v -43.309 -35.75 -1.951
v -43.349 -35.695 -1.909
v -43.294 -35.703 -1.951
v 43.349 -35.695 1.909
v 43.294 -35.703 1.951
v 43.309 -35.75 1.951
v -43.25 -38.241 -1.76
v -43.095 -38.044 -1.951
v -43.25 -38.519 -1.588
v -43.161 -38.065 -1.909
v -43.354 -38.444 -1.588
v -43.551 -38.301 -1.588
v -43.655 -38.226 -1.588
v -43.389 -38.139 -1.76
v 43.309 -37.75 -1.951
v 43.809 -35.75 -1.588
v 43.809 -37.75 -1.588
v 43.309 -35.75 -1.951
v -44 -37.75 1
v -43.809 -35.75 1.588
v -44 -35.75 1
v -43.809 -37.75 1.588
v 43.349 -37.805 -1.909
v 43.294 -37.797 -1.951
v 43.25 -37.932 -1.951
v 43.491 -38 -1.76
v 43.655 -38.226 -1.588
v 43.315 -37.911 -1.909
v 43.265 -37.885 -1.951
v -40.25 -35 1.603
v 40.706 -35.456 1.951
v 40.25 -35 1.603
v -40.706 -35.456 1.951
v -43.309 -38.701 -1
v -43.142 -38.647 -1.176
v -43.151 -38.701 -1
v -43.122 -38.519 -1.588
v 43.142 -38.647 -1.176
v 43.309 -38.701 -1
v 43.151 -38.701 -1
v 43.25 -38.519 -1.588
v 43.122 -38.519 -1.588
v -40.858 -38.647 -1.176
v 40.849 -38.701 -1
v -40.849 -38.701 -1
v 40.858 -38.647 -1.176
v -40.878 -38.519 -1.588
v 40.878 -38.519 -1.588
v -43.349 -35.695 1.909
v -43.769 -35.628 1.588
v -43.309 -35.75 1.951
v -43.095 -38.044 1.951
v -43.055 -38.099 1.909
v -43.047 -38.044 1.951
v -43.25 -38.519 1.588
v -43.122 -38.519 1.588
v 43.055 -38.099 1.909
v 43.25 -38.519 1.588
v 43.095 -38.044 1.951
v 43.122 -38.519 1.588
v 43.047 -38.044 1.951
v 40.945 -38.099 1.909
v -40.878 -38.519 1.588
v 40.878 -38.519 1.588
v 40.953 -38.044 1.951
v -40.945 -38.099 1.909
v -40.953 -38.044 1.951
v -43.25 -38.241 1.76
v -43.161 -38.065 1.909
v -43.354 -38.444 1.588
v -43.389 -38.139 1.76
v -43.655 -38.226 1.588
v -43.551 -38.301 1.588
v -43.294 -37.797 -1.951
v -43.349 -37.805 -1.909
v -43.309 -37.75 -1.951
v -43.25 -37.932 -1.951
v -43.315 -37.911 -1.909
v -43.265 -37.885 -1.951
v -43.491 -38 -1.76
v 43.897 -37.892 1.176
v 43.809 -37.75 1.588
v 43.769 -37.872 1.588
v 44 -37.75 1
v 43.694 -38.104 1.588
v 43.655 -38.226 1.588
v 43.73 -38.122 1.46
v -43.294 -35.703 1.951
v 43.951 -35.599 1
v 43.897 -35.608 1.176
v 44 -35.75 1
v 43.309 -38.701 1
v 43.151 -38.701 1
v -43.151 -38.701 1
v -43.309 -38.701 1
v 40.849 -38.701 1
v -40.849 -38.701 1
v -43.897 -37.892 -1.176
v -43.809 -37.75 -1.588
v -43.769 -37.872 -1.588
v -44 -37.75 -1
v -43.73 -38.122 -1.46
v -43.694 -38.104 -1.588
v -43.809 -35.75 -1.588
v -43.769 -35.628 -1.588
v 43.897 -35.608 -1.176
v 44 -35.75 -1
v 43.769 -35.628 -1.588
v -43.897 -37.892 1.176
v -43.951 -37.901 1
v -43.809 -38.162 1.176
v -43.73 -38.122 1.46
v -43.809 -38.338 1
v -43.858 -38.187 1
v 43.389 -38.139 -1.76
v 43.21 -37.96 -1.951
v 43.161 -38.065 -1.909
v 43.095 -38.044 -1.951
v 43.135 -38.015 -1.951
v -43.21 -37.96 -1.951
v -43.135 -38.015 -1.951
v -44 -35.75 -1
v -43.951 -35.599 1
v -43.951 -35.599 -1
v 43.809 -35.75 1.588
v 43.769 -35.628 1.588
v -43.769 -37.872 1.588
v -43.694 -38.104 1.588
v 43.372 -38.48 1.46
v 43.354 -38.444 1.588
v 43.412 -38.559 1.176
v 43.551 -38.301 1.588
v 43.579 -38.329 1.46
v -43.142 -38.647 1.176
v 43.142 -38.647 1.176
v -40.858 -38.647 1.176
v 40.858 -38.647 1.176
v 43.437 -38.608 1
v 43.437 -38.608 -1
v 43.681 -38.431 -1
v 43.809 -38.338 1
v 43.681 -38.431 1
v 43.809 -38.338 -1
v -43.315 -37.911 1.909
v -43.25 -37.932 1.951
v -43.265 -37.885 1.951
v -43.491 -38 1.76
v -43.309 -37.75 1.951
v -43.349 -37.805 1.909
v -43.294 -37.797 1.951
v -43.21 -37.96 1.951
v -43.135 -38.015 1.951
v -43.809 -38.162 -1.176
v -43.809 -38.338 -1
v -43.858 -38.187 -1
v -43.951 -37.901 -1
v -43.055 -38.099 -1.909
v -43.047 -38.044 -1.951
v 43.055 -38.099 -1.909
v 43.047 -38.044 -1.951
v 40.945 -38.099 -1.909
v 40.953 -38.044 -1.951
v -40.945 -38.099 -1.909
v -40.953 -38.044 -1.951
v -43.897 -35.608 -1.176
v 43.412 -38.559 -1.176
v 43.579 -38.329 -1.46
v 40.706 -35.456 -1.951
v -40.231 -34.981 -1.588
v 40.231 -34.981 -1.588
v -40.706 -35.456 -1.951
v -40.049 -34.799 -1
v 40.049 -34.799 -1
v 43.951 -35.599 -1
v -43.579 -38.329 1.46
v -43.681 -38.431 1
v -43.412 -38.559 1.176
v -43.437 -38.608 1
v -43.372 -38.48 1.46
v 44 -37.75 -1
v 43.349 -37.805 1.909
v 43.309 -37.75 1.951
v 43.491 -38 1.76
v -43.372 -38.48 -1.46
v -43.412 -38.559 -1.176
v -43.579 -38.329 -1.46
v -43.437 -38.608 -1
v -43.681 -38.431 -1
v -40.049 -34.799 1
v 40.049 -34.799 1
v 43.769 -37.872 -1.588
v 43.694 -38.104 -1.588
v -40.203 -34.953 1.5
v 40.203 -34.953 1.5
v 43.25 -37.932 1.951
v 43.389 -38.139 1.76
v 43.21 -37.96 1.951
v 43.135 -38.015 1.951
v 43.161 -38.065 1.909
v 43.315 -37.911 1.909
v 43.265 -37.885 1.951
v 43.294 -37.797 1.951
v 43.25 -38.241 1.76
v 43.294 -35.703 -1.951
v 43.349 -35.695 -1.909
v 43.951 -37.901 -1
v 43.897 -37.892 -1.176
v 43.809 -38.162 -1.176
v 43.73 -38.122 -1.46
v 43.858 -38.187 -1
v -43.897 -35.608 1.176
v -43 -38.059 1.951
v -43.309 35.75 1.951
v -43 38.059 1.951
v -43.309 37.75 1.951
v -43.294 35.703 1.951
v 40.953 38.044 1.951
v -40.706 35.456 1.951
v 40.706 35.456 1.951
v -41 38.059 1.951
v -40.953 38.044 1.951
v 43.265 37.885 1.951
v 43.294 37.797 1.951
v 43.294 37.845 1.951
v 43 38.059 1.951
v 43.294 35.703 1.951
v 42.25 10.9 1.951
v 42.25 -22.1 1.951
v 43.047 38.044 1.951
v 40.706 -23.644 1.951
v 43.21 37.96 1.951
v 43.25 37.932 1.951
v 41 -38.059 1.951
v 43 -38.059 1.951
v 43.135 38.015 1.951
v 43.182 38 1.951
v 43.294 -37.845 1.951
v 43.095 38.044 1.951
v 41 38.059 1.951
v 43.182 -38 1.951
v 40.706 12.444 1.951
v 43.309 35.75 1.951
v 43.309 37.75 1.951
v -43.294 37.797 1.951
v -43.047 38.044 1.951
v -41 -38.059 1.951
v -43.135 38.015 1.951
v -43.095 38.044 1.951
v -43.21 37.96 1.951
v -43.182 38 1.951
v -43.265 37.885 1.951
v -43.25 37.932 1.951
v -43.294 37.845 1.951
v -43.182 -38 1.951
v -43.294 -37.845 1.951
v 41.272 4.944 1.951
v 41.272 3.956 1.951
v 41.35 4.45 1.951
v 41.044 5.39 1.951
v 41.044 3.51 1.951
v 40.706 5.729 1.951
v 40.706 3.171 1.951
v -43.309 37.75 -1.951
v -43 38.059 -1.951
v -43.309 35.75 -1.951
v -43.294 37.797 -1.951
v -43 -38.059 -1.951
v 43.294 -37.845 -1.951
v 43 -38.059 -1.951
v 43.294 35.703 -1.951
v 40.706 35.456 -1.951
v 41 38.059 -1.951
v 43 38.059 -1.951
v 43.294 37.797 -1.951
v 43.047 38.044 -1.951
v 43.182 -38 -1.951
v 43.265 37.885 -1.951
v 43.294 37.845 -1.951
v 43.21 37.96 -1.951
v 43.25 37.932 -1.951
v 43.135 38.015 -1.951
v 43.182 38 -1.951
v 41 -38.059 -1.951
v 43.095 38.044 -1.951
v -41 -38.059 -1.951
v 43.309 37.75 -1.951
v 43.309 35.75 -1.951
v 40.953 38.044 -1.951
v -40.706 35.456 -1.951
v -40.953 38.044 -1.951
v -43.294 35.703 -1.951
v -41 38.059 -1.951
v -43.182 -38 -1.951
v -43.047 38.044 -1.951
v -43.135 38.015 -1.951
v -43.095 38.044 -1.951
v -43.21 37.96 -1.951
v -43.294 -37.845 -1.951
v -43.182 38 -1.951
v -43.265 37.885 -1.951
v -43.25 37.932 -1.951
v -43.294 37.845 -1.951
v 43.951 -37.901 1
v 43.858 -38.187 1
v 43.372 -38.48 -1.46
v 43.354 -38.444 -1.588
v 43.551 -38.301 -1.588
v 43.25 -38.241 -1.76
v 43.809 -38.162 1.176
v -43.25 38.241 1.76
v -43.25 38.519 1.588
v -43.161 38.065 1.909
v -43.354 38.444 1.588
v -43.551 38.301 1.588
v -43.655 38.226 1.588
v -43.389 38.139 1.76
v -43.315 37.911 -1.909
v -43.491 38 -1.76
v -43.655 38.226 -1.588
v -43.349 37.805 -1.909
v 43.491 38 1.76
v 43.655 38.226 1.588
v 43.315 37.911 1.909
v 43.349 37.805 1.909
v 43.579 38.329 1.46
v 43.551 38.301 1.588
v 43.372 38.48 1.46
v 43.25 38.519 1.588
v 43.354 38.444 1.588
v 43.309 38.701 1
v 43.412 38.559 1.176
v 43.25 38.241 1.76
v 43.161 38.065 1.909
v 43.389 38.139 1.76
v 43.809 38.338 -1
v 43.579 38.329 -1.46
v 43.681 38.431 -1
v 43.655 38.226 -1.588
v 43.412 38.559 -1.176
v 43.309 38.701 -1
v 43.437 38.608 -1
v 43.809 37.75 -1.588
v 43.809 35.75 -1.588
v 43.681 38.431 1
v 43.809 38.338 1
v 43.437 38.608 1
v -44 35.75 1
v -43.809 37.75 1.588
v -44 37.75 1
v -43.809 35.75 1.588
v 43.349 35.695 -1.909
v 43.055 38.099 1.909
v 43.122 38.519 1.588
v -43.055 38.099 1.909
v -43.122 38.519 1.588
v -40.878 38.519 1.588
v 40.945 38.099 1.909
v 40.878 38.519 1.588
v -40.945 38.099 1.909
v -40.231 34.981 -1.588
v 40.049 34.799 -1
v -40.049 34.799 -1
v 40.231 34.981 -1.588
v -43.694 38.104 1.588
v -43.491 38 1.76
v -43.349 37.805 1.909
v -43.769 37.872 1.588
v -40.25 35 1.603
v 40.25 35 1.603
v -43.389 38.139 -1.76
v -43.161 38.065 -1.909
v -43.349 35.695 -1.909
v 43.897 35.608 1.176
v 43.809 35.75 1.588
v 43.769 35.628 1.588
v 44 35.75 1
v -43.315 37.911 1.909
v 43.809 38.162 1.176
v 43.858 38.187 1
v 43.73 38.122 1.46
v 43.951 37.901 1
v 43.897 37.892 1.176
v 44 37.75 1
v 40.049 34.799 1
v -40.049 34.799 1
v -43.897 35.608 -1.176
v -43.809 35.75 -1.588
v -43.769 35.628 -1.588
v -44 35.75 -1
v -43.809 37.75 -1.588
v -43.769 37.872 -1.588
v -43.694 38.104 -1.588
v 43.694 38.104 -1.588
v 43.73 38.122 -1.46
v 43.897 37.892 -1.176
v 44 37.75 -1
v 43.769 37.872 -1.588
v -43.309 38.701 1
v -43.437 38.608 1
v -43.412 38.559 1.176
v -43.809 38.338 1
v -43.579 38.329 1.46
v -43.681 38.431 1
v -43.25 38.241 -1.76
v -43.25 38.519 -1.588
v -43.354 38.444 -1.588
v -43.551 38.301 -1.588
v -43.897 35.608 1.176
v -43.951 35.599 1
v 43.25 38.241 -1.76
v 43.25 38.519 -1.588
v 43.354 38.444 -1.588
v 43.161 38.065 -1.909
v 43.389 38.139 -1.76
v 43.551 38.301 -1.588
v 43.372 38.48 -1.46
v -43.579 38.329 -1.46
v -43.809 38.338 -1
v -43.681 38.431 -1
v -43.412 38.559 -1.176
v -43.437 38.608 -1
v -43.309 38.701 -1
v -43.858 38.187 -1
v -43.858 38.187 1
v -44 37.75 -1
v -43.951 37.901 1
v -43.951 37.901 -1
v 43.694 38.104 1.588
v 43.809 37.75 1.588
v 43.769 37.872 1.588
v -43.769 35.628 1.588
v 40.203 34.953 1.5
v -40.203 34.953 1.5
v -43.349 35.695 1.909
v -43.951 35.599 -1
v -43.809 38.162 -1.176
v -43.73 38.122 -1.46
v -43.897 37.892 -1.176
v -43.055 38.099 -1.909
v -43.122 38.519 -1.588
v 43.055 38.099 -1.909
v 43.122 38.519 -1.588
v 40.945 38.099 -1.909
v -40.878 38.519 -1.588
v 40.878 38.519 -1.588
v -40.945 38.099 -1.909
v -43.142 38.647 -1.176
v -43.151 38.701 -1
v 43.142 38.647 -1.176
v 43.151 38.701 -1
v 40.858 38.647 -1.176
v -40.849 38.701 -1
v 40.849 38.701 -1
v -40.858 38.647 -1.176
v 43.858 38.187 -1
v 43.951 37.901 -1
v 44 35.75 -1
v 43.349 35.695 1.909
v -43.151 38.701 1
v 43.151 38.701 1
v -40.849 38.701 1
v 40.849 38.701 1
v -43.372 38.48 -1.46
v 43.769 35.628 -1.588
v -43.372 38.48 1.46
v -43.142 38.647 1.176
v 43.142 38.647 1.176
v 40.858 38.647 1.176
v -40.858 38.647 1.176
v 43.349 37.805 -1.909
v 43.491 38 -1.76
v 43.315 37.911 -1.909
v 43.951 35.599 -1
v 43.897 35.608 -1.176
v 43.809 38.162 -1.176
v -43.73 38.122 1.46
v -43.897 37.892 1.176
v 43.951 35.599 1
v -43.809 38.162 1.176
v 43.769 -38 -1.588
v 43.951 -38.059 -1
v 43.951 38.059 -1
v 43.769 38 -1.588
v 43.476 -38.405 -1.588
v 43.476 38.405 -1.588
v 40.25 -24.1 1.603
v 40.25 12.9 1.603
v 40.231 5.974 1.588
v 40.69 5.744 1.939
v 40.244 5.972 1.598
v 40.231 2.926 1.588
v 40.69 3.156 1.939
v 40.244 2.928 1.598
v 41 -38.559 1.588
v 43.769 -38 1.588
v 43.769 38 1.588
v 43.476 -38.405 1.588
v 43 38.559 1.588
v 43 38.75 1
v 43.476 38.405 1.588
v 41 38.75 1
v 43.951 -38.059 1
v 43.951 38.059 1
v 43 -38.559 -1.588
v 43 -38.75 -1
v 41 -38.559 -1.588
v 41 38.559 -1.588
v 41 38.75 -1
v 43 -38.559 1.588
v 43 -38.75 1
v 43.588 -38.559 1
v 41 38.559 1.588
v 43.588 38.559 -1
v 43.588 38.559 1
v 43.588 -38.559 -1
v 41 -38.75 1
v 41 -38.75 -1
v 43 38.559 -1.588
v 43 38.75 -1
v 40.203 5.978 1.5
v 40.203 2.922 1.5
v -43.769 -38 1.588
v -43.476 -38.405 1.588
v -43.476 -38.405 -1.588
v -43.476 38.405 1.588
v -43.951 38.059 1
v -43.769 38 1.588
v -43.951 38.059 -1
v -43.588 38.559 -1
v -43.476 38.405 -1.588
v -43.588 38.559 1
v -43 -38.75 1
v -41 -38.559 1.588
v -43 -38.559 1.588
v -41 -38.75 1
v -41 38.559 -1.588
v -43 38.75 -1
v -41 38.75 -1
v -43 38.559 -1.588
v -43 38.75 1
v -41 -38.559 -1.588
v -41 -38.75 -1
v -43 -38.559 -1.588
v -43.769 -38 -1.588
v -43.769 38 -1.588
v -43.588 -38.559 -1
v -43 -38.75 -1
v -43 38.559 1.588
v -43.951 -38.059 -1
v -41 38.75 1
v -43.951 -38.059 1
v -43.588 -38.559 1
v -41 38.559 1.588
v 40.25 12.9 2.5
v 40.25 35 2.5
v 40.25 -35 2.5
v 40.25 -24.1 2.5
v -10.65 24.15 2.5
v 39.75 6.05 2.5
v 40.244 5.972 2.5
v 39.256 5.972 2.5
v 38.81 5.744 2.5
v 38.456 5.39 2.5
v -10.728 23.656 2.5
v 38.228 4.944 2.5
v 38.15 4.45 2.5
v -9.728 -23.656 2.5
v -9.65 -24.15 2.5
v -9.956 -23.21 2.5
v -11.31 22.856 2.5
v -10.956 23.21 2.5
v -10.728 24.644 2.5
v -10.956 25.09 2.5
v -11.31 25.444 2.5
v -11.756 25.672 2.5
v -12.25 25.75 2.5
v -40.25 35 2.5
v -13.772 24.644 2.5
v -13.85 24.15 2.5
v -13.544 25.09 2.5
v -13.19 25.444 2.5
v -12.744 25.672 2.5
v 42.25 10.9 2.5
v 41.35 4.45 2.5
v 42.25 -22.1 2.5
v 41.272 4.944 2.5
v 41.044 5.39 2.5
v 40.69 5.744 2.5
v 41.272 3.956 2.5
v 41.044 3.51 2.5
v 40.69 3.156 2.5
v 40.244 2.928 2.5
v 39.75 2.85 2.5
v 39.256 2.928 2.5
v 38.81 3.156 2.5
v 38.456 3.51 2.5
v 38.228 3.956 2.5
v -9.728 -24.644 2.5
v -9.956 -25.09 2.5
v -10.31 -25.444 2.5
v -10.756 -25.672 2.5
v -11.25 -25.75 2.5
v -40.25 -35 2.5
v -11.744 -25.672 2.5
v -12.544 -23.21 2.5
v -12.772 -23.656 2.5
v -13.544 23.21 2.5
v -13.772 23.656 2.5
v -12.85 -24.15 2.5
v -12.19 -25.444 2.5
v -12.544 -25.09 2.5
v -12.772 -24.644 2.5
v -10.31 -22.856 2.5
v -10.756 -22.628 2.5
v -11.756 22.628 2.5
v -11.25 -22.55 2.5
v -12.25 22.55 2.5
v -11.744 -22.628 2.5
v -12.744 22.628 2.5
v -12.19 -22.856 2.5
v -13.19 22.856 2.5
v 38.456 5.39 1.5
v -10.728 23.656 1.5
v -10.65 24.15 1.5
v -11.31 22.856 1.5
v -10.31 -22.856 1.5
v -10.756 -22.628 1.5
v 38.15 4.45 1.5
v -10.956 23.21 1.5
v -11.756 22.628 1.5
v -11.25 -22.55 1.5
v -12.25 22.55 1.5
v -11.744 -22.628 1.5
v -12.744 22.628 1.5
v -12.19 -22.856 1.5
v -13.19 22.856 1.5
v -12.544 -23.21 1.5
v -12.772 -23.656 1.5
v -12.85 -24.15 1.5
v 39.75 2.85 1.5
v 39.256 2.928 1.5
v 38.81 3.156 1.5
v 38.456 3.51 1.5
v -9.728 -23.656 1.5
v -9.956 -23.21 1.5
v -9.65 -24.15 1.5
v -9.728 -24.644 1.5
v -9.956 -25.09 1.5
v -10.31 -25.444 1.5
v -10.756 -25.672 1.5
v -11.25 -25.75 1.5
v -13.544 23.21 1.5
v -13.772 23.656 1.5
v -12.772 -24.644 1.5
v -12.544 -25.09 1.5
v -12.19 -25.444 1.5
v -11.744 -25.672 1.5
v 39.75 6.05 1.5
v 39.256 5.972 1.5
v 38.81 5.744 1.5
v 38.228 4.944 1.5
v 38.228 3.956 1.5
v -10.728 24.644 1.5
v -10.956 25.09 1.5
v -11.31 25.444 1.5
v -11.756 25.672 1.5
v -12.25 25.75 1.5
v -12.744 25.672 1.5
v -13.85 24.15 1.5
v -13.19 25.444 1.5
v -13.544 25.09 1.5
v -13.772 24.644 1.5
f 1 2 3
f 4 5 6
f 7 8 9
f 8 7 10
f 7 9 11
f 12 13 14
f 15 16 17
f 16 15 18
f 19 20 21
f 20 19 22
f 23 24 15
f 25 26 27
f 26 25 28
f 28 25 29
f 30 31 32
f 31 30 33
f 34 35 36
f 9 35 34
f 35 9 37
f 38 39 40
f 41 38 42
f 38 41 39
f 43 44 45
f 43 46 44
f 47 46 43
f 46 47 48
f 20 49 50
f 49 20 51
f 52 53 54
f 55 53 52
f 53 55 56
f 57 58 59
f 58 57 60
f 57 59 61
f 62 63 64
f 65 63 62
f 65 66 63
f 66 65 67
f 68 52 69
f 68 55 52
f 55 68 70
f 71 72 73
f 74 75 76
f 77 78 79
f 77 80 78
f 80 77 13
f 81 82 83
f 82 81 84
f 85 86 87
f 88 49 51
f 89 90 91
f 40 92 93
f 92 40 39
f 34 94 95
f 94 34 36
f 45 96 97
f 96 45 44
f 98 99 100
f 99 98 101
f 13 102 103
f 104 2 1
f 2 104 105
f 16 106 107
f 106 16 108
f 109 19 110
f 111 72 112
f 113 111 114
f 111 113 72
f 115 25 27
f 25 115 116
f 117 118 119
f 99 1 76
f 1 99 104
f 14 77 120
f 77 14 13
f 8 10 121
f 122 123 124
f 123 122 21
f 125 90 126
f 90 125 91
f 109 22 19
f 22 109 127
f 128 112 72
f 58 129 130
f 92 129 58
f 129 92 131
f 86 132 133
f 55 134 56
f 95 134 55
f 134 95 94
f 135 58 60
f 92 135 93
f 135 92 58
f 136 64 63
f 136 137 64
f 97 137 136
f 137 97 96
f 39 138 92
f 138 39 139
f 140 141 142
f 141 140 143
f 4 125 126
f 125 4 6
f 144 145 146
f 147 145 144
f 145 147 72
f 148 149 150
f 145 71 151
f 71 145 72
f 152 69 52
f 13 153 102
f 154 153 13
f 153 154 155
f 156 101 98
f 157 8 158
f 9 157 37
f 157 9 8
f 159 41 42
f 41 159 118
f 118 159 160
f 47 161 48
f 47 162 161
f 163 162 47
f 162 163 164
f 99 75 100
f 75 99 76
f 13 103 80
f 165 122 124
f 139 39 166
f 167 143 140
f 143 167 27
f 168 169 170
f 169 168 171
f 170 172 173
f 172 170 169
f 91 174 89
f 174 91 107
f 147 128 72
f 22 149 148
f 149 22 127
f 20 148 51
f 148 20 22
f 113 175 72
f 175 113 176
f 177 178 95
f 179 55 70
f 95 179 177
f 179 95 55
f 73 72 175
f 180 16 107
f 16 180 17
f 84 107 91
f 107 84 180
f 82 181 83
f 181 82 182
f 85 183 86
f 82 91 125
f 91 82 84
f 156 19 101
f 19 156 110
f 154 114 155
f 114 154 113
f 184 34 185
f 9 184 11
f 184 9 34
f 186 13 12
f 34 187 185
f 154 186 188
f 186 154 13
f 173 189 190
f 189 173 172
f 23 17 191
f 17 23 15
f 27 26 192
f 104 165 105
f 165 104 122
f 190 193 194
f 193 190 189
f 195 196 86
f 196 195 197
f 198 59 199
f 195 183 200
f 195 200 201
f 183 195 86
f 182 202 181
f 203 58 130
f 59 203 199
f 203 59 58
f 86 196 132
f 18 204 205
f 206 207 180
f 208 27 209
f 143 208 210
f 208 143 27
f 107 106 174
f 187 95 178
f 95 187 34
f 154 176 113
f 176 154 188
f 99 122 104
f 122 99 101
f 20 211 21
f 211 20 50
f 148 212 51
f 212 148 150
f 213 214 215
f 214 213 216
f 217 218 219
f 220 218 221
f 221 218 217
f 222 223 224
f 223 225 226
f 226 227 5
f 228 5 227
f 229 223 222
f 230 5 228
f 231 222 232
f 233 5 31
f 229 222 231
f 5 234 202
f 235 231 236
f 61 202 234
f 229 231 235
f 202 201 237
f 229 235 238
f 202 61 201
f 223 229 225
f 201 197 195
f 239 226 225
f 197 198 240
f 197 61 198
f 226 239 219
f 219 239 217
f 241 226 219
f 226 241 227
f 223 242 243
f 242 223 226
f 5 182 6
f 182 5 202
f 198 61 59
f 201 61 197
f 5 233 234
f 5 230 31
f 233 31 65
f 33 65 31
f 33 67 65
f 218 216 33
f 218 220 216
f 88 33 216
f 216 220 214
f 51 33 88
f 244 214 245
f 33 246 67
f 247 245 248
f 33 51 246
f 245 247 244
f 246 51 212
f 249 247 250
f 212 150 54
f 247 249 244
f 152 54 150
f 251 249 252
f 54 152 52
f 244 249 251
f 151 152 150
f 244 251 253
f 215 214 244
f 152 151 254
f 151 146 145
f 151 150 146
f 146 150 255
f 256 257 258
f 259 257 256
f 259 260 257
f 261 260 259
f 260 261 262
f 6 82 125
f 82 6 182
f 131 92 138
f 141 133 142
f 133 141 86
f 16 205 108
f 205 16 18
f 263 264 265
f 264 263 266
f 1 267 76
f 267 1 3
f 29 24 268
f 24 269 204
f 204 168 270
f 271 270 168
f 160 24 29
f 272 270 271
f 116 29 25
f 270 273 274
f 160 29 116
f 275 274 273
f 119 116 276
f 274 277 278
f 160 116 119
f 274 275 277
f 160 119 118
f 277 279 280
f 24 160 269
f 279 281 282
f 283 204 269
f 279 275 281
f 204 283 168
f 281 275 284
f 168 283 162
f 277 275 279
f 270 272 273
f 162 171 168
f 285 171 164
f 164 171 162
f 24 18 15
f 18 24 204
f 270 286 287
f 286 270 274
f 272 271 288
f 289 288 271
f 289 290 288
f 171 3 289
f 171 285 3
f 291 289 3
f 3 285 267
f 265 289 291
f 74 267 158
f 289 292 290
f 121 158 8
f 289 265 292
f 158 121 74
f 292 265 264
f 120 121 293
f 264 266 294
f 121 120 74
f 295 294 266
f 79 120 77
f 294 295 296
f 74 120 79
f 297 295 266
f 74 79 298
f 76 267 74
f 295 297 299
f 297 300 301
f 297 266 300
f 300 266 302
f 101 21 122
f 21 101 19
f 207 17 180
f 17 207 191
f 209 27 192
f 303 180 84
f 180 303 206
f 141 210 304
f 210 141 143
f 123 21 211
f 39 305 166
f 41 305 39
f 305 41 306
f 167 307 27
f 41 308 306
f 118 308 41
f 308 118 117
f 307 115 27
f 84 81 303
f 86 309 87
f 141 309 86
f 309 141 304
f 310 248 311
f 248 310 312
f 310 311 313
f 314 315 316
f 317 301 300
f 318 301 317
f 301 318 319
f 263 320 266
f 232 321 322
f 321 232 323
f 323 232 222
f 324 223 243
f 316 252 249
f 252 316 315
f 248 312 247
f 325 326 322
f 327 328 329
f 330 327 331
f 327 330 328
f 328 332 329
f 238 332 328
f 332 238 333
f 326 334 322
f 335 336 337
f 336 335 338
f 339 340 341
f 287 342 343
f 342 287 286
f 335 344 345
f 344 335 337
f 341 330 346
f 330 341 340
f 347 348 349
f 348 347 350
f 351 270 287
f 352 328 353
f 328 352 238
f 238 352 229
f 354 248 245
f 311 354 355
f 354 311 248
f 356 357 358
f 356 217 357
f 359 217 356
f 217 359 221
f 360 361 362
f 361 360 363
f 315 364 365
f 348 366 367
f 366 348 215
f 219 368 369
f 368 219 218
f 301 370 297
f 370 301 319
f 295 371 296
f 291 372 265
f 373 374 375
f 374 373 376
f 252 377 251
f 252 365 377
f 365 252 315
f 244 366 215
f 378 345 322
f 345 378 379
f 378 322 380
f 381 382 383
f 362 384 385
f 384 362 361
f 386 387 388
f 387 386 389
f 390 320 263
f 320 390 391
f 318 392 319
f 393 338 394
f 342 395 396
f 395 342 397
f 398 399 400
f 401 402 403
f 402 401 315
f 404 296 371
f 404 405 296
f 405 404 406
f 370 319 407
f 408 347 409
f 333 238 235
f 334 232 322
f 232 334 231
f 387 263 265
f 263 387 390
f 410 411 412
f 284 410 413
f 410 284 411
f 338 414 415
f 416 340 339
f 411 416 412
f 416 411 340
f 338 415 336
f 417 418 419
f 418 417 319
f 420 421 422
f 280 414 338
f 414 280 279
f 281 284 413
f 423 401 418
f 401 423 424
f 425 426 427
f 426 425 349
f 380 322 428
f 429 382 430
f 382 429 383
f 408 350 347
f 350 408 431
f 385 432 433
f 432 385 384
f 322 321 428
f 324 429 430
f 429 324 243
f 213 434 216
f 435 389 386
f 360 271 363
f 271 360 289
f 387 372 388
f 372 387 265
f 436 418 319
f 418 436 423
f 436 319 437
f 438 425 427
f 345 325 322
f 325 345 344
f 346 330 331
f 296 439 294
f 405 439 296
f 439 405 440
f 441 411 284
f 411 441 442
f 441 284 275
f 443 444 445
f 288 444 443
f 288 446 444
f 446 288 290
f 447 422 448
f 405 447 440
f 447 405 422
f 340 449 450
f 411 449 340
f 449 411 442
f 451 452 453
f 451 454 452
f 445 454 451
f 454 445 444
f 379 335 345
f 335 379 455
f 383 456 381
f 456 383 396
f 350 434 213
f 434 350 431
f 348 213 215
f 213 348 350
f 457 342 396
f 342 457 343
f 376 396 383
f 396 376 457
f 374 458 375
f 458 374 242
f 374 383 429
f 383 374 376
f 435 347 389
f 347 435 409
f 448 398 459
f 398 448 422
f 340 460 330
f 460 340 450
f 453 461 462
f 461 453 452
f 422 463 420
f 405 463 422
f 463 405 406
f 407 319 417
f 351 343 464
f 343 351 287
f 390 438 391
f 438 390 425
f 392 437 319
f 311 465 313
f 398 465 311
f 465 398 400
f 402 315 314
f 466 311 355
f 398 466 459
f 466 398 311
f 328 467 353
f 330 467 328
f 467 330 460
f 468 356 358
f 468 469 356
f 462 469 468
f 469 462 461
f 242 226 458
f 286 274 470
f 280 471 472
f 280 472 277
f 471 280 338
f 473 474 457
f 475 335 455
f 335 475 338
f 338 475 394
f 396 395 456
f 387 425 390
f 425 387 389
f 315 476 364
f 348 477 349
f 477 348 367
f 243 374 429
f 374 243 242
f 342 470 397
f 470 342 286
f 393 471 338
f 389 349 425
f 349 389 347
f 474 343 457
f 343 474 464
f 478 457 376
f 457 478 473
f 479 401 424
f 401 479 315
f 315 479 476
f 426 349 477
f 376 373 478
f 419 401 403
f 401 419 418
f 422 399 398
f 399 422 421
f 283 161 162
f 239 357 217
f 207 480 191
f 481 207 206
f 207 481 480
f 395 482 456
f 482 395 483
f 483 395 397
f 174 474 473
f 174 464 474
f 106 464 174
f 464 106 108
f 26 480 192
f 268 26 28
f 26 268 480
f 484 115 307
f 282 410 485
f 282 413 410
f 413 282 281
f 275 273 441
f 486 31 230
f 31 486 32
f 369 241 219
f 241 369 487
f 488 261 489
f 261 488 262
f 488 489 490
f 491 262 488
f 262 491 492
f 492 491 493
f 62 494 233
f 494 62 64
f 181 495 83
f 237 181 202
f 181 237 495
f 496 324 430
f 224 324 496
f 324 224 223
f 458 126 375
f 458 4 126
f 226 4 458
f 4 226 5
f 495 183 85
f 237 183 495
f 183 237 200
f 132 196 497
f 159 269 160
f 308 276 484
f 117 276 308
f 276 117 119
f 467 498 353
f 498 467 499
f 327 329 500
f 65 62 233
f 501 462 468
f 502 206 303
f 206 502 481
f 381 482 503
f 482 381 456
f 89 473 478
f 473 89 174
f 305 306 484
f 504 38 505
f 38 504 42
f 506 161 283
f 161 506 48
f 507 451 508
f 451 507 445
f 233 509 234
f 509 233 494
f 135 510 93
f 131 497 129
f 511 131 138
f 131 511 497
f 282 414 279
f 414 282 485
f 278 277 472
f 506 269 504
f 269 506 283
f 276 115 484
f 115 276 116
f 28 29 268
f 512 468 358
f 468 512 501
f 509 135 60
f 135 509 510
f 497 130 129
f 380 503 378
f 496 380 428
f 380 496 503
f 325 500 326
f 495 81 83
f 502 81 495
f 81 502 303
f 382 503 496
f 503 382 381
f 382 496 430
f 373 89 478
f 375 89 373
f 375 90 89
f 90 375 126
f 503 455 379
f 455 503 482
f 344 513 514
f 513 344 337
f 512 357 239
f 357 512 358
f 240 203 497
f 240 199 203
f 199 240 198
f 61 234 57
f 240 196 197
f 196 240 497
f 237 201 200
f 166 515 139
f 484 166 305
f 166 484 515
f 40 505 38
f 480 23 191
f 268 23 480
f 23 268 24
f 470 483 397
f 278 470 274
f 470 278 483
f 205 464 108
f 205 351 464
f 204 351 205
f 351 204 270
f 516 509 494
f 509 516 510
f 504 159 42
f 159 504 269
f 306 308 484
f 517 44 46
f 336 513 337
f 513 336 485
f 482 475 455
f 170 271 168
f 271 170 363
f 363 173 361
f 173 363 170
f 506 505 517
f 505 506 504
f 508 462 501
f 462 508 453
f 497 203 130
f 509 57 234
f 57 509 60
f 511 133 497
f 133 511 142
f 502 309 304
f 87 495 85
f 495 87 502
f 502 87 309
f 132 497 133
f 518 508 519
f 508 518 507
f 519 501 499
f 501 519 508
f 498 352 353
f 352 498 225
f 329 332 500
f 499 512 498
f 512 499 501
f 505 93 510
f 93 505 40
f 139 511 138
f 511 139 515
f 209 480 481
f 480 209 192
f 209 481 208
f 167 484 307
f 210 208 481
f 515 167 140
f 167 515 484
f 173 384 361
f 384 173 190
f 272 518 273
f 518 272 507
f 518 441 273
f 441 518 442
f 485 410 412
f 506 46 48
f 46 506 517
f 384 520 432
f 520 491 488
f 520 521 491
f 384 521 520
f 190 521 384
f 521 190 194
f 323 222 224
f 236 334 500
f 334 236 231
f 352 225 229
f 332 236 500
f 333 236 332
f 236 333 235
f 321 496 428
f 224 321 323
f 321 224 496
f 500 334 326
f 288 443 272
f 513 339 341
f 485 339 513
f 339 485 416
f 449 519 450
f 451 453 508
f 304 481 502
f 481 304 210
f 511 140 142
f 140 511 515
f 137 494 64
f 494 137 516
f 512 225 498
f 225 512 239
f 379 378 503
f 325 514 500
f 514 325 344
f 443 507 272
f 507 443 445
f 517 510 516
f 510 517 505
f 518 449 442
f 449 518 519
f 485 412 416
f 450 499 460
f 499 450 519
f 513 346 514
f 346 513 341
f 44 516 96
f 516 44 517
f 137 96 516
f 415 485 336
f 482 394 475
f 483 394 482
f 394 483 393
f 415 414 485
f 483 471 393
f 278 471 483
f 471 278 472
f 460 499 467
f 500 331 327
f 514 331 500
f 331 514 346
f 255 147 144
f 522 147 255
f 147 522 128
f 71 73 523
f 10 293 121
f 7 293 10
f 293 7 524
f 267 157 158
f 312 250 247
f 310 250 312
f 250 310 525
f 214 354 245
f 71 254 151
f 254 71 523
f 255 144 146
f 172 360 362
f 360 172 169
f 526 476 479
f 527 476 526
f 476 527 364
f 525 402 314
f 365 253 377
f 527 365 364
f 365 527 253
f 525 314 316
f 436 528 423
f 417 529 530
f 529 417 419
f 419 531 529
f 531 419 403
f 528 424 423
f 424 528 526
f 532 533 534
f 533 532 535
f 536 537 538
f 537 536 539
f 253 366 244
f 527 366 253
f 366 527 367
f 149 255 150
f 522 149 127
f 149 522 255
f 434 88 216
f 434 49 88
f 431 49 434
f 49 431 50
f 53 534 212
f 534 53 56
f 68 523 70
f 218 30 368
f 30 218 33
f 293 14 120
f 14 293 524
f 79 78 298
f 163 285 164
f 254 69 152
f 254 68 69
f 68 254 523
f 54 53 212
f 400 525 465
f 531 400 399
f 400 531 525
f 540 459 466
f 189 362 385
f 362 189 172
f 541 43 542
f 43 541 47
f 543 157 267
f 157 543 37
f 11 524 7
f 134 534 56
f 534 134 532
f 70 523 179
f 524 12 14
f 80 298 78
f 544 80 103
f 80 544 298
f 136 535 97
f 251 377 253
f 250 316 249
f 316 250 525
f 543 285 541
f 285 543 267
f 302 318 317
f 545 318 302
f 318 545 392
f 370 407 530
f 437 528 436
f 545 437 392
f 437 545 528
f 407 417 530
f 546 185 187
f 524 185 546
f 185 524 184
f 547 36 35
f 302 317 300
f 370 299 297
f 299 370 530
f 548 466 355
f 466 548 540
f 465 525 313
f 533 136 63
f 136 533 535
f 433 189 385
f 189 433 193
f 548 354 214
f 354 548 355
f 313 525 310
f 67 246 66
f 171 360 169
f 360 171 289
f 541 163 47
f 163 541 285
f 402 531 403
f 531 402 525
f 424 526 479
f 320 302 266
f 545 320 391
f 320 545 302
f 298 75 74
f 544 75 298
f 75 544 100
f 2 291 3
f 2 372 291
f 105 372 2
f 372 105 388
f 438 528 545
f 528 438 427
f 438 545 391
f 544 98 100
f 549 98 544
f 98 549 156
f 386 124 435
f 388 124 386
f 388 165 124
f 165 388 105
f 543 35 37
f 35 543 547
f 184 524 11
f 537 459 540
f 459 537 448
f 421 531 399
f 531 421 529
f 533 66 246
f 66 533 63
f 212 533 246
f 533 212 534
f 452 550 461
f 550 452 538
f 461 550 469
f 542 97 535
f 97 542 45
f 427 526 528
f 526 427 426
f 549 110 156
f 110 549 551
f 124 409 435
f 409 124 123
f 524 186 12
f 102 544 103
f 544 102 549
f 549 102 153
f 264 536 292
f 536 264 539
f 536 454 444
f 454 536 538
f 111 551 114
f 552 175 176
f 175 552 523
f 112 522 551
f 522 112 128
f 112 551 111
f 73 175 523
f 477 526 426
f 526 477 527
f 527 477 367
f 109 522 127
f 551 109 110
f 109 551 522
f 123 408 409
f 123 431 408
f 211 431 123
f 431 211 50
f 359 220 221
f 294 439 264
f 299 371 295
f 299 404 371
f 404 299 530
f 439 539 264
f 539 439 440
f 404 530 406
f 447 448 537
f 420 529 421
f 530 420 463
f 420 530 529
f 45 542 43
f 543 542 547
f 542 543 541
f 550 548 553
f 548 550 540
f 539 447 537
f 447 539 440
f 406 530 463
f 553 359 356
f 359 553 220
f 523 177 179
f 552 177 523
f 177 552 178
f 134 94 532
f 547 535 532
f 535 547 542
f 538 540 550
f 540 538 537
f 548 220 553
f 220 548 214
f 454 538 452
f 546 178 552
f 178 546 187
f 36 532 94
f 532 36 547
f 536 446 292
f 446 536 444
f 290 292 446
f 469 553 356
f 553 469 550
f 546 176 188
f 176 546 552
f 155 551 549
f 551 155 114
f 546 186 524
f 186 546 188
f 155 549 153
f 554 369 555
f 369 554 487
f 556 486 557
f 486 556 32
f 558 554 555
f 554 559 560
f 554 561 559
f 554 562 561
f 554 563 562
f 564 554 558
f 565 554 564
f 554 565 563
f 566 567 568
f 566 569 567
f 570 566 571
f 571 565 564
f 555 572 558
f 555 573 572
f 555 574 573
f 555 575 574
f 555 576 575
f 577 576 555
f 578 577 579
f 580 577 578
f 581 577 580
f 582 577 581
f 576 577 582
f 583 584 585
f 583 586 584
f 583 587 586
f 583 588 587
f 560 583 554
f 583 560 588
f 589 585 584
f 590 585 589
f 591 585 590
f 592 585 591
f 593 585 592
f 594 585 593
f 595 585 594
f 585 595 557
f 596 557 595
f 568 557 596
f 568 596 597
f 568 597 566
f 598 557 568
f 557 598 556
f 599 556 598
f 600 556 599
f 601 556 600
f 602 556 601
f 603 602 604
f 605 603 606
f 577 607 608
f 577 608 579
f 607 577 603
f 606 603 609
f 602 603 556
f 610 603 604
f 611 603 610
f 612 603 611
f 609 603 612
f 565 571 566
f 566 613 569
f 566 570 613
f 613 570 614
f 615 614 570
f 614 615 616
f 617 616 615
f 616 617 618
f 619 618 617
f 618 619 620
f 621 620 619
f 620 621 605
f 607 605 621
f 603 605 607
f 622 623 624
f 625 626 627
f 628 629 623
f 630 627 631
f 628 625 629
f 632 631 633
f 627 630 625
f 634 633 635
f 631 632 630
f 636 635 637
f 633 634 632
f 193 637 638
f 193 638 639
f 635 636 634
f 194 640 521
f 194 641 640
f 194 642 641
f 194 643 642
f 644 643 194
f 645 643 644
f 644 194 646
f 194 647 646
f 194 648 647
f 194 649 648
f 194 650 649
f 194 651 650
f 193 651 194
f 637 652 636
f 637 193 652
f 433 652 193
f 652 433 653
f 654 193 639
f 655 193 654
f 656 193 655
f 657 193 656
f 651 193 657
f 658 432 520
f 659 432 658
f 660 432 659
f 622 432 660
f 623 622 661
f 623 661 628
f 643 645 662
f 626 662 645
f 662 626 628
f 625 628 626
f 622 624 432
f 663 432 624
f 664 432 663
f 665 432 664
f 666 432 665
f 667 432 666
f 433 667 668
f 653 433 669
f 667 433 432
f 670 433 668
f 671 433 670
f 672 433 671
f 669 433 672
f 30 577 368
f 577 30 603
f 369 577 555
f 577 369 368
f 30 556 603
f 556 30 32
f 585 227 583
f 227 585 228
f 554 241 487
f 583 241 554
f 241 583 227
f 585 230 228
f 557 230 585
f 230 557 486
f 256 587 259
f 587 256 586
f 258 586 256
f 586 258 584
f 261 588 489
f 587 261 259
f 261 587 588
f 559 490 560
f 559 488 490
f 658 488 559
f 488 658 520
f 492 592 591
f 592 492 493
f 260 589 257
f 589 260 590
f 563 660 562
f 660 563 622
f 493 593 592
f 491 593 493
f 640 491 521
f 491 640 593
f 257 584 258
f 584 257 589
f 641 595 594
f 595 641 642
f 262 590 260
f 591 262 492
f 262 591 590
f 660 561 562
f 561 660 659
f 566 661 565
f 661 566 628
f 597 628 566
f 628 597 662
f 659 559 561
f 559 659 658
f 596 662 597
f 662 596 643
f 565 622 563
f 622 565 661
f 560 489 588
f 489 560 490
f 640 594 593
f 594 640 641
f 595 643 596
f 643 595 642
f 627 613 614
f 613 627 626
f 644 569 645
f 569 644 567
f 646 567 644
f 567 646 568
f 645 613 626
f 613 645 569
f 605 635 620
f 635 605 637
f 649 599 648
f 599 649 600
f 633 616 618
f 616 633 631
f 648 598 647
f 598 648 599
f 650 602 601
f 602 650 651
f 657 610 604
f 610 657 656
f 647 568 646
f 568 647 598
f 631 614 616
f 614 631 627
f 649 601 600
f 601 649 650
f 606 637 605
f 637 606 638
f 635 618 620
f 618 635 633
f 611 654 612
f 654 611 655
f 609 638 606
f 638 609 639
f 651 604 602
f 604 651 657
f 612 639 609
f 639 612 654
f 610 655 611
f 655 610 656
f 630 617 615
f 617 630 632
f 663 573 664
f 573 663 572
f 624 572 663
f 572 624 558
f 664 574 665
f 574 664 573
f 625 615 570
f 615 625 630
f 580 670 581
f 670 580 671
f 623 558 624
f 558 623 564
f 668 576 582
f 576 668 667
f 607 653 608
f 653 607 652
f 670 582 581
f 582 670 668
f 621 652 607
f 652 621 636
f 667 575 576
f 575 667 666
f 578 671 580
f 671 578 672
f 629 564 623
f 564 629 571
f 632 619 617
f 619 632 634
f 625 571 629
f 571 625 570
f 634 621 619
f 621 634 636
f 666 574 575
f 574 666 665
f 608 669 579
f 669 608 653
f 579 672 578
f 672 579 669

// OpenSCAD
// file: Nucleo.scad
module nucleo(){
color([0.9,0.9,0.9])
union(){
difference(){
union(){
cube([80.5,70,1],center=true);
translate([80.5/2+1,-8.5+2.9,0])cube([2,33,1],center=true);
translate([80.5/2,33/2-8.5+2.9,0])
linear_extrude(1,center=true)polygon(points=[[0,2],[2,0],[0,0]]);

translate([80.5/2,-33/2-8.5+2.9,0])rotate([0,0,-90])
linear_extrude(1,center=true)polygon(points=[[0,2],[2,0],[0,0]]);
}

translate([80.5/2-0.5,8.9/2,0])cylinder(2,1.6,1.6,center=true,$fn=20);

translate([-13.85+1.6+1.0,-24.15,0])cylinder(2,1.6,1.6,center=true,$fn=20);
translate([-14.85+1.6+1.0,24.15,0])cylinder(2,1.6,1.6,center=true,$fn=20);

}
}
}

//nucleo();
// file: Rounded3dCube.scad
module RoundedCube(x,y,z,r){
minkowski() {
  cube([x,y,z],center=true);
  // rounded corners
  sphere(r);
}
}
// main file
include<Rounded3dCube.scad>
include<Nucleo.scad>
R=1;
Cy=2;
Cz=2;
$fn=10;
Lx=80.5+R+Cy+0.5;
Ly=70+R+Cy+0.5;
R2=1.5;
Cy2=0.001;
Cz2=0.001;


translate([0,-Ly/2,0])
union(){
difference(){
union(){
RoundedCube(Lx+Cy,Cy,Cz,R);
translate([0,Ly,0])RoundedCube(Lx+Cy,Cy,Cz,R);
color([1,0,0])translate([Lx/2,Ly/2,0])rotate([0,0,90])RoundedCube(Ly+Cy,Cy,Cz,R);
color([0,0,1])translate([-Lx/2,Ly/2,0])rotate([0,0,90])RoundedCube(Ly+Cy,Cy,Cz,R);
}
//translate([Lx/2-3+2*R,+43.9,0.8])cylinder(10,3,3);
}



}


translate([0,0,2])nucleo();
